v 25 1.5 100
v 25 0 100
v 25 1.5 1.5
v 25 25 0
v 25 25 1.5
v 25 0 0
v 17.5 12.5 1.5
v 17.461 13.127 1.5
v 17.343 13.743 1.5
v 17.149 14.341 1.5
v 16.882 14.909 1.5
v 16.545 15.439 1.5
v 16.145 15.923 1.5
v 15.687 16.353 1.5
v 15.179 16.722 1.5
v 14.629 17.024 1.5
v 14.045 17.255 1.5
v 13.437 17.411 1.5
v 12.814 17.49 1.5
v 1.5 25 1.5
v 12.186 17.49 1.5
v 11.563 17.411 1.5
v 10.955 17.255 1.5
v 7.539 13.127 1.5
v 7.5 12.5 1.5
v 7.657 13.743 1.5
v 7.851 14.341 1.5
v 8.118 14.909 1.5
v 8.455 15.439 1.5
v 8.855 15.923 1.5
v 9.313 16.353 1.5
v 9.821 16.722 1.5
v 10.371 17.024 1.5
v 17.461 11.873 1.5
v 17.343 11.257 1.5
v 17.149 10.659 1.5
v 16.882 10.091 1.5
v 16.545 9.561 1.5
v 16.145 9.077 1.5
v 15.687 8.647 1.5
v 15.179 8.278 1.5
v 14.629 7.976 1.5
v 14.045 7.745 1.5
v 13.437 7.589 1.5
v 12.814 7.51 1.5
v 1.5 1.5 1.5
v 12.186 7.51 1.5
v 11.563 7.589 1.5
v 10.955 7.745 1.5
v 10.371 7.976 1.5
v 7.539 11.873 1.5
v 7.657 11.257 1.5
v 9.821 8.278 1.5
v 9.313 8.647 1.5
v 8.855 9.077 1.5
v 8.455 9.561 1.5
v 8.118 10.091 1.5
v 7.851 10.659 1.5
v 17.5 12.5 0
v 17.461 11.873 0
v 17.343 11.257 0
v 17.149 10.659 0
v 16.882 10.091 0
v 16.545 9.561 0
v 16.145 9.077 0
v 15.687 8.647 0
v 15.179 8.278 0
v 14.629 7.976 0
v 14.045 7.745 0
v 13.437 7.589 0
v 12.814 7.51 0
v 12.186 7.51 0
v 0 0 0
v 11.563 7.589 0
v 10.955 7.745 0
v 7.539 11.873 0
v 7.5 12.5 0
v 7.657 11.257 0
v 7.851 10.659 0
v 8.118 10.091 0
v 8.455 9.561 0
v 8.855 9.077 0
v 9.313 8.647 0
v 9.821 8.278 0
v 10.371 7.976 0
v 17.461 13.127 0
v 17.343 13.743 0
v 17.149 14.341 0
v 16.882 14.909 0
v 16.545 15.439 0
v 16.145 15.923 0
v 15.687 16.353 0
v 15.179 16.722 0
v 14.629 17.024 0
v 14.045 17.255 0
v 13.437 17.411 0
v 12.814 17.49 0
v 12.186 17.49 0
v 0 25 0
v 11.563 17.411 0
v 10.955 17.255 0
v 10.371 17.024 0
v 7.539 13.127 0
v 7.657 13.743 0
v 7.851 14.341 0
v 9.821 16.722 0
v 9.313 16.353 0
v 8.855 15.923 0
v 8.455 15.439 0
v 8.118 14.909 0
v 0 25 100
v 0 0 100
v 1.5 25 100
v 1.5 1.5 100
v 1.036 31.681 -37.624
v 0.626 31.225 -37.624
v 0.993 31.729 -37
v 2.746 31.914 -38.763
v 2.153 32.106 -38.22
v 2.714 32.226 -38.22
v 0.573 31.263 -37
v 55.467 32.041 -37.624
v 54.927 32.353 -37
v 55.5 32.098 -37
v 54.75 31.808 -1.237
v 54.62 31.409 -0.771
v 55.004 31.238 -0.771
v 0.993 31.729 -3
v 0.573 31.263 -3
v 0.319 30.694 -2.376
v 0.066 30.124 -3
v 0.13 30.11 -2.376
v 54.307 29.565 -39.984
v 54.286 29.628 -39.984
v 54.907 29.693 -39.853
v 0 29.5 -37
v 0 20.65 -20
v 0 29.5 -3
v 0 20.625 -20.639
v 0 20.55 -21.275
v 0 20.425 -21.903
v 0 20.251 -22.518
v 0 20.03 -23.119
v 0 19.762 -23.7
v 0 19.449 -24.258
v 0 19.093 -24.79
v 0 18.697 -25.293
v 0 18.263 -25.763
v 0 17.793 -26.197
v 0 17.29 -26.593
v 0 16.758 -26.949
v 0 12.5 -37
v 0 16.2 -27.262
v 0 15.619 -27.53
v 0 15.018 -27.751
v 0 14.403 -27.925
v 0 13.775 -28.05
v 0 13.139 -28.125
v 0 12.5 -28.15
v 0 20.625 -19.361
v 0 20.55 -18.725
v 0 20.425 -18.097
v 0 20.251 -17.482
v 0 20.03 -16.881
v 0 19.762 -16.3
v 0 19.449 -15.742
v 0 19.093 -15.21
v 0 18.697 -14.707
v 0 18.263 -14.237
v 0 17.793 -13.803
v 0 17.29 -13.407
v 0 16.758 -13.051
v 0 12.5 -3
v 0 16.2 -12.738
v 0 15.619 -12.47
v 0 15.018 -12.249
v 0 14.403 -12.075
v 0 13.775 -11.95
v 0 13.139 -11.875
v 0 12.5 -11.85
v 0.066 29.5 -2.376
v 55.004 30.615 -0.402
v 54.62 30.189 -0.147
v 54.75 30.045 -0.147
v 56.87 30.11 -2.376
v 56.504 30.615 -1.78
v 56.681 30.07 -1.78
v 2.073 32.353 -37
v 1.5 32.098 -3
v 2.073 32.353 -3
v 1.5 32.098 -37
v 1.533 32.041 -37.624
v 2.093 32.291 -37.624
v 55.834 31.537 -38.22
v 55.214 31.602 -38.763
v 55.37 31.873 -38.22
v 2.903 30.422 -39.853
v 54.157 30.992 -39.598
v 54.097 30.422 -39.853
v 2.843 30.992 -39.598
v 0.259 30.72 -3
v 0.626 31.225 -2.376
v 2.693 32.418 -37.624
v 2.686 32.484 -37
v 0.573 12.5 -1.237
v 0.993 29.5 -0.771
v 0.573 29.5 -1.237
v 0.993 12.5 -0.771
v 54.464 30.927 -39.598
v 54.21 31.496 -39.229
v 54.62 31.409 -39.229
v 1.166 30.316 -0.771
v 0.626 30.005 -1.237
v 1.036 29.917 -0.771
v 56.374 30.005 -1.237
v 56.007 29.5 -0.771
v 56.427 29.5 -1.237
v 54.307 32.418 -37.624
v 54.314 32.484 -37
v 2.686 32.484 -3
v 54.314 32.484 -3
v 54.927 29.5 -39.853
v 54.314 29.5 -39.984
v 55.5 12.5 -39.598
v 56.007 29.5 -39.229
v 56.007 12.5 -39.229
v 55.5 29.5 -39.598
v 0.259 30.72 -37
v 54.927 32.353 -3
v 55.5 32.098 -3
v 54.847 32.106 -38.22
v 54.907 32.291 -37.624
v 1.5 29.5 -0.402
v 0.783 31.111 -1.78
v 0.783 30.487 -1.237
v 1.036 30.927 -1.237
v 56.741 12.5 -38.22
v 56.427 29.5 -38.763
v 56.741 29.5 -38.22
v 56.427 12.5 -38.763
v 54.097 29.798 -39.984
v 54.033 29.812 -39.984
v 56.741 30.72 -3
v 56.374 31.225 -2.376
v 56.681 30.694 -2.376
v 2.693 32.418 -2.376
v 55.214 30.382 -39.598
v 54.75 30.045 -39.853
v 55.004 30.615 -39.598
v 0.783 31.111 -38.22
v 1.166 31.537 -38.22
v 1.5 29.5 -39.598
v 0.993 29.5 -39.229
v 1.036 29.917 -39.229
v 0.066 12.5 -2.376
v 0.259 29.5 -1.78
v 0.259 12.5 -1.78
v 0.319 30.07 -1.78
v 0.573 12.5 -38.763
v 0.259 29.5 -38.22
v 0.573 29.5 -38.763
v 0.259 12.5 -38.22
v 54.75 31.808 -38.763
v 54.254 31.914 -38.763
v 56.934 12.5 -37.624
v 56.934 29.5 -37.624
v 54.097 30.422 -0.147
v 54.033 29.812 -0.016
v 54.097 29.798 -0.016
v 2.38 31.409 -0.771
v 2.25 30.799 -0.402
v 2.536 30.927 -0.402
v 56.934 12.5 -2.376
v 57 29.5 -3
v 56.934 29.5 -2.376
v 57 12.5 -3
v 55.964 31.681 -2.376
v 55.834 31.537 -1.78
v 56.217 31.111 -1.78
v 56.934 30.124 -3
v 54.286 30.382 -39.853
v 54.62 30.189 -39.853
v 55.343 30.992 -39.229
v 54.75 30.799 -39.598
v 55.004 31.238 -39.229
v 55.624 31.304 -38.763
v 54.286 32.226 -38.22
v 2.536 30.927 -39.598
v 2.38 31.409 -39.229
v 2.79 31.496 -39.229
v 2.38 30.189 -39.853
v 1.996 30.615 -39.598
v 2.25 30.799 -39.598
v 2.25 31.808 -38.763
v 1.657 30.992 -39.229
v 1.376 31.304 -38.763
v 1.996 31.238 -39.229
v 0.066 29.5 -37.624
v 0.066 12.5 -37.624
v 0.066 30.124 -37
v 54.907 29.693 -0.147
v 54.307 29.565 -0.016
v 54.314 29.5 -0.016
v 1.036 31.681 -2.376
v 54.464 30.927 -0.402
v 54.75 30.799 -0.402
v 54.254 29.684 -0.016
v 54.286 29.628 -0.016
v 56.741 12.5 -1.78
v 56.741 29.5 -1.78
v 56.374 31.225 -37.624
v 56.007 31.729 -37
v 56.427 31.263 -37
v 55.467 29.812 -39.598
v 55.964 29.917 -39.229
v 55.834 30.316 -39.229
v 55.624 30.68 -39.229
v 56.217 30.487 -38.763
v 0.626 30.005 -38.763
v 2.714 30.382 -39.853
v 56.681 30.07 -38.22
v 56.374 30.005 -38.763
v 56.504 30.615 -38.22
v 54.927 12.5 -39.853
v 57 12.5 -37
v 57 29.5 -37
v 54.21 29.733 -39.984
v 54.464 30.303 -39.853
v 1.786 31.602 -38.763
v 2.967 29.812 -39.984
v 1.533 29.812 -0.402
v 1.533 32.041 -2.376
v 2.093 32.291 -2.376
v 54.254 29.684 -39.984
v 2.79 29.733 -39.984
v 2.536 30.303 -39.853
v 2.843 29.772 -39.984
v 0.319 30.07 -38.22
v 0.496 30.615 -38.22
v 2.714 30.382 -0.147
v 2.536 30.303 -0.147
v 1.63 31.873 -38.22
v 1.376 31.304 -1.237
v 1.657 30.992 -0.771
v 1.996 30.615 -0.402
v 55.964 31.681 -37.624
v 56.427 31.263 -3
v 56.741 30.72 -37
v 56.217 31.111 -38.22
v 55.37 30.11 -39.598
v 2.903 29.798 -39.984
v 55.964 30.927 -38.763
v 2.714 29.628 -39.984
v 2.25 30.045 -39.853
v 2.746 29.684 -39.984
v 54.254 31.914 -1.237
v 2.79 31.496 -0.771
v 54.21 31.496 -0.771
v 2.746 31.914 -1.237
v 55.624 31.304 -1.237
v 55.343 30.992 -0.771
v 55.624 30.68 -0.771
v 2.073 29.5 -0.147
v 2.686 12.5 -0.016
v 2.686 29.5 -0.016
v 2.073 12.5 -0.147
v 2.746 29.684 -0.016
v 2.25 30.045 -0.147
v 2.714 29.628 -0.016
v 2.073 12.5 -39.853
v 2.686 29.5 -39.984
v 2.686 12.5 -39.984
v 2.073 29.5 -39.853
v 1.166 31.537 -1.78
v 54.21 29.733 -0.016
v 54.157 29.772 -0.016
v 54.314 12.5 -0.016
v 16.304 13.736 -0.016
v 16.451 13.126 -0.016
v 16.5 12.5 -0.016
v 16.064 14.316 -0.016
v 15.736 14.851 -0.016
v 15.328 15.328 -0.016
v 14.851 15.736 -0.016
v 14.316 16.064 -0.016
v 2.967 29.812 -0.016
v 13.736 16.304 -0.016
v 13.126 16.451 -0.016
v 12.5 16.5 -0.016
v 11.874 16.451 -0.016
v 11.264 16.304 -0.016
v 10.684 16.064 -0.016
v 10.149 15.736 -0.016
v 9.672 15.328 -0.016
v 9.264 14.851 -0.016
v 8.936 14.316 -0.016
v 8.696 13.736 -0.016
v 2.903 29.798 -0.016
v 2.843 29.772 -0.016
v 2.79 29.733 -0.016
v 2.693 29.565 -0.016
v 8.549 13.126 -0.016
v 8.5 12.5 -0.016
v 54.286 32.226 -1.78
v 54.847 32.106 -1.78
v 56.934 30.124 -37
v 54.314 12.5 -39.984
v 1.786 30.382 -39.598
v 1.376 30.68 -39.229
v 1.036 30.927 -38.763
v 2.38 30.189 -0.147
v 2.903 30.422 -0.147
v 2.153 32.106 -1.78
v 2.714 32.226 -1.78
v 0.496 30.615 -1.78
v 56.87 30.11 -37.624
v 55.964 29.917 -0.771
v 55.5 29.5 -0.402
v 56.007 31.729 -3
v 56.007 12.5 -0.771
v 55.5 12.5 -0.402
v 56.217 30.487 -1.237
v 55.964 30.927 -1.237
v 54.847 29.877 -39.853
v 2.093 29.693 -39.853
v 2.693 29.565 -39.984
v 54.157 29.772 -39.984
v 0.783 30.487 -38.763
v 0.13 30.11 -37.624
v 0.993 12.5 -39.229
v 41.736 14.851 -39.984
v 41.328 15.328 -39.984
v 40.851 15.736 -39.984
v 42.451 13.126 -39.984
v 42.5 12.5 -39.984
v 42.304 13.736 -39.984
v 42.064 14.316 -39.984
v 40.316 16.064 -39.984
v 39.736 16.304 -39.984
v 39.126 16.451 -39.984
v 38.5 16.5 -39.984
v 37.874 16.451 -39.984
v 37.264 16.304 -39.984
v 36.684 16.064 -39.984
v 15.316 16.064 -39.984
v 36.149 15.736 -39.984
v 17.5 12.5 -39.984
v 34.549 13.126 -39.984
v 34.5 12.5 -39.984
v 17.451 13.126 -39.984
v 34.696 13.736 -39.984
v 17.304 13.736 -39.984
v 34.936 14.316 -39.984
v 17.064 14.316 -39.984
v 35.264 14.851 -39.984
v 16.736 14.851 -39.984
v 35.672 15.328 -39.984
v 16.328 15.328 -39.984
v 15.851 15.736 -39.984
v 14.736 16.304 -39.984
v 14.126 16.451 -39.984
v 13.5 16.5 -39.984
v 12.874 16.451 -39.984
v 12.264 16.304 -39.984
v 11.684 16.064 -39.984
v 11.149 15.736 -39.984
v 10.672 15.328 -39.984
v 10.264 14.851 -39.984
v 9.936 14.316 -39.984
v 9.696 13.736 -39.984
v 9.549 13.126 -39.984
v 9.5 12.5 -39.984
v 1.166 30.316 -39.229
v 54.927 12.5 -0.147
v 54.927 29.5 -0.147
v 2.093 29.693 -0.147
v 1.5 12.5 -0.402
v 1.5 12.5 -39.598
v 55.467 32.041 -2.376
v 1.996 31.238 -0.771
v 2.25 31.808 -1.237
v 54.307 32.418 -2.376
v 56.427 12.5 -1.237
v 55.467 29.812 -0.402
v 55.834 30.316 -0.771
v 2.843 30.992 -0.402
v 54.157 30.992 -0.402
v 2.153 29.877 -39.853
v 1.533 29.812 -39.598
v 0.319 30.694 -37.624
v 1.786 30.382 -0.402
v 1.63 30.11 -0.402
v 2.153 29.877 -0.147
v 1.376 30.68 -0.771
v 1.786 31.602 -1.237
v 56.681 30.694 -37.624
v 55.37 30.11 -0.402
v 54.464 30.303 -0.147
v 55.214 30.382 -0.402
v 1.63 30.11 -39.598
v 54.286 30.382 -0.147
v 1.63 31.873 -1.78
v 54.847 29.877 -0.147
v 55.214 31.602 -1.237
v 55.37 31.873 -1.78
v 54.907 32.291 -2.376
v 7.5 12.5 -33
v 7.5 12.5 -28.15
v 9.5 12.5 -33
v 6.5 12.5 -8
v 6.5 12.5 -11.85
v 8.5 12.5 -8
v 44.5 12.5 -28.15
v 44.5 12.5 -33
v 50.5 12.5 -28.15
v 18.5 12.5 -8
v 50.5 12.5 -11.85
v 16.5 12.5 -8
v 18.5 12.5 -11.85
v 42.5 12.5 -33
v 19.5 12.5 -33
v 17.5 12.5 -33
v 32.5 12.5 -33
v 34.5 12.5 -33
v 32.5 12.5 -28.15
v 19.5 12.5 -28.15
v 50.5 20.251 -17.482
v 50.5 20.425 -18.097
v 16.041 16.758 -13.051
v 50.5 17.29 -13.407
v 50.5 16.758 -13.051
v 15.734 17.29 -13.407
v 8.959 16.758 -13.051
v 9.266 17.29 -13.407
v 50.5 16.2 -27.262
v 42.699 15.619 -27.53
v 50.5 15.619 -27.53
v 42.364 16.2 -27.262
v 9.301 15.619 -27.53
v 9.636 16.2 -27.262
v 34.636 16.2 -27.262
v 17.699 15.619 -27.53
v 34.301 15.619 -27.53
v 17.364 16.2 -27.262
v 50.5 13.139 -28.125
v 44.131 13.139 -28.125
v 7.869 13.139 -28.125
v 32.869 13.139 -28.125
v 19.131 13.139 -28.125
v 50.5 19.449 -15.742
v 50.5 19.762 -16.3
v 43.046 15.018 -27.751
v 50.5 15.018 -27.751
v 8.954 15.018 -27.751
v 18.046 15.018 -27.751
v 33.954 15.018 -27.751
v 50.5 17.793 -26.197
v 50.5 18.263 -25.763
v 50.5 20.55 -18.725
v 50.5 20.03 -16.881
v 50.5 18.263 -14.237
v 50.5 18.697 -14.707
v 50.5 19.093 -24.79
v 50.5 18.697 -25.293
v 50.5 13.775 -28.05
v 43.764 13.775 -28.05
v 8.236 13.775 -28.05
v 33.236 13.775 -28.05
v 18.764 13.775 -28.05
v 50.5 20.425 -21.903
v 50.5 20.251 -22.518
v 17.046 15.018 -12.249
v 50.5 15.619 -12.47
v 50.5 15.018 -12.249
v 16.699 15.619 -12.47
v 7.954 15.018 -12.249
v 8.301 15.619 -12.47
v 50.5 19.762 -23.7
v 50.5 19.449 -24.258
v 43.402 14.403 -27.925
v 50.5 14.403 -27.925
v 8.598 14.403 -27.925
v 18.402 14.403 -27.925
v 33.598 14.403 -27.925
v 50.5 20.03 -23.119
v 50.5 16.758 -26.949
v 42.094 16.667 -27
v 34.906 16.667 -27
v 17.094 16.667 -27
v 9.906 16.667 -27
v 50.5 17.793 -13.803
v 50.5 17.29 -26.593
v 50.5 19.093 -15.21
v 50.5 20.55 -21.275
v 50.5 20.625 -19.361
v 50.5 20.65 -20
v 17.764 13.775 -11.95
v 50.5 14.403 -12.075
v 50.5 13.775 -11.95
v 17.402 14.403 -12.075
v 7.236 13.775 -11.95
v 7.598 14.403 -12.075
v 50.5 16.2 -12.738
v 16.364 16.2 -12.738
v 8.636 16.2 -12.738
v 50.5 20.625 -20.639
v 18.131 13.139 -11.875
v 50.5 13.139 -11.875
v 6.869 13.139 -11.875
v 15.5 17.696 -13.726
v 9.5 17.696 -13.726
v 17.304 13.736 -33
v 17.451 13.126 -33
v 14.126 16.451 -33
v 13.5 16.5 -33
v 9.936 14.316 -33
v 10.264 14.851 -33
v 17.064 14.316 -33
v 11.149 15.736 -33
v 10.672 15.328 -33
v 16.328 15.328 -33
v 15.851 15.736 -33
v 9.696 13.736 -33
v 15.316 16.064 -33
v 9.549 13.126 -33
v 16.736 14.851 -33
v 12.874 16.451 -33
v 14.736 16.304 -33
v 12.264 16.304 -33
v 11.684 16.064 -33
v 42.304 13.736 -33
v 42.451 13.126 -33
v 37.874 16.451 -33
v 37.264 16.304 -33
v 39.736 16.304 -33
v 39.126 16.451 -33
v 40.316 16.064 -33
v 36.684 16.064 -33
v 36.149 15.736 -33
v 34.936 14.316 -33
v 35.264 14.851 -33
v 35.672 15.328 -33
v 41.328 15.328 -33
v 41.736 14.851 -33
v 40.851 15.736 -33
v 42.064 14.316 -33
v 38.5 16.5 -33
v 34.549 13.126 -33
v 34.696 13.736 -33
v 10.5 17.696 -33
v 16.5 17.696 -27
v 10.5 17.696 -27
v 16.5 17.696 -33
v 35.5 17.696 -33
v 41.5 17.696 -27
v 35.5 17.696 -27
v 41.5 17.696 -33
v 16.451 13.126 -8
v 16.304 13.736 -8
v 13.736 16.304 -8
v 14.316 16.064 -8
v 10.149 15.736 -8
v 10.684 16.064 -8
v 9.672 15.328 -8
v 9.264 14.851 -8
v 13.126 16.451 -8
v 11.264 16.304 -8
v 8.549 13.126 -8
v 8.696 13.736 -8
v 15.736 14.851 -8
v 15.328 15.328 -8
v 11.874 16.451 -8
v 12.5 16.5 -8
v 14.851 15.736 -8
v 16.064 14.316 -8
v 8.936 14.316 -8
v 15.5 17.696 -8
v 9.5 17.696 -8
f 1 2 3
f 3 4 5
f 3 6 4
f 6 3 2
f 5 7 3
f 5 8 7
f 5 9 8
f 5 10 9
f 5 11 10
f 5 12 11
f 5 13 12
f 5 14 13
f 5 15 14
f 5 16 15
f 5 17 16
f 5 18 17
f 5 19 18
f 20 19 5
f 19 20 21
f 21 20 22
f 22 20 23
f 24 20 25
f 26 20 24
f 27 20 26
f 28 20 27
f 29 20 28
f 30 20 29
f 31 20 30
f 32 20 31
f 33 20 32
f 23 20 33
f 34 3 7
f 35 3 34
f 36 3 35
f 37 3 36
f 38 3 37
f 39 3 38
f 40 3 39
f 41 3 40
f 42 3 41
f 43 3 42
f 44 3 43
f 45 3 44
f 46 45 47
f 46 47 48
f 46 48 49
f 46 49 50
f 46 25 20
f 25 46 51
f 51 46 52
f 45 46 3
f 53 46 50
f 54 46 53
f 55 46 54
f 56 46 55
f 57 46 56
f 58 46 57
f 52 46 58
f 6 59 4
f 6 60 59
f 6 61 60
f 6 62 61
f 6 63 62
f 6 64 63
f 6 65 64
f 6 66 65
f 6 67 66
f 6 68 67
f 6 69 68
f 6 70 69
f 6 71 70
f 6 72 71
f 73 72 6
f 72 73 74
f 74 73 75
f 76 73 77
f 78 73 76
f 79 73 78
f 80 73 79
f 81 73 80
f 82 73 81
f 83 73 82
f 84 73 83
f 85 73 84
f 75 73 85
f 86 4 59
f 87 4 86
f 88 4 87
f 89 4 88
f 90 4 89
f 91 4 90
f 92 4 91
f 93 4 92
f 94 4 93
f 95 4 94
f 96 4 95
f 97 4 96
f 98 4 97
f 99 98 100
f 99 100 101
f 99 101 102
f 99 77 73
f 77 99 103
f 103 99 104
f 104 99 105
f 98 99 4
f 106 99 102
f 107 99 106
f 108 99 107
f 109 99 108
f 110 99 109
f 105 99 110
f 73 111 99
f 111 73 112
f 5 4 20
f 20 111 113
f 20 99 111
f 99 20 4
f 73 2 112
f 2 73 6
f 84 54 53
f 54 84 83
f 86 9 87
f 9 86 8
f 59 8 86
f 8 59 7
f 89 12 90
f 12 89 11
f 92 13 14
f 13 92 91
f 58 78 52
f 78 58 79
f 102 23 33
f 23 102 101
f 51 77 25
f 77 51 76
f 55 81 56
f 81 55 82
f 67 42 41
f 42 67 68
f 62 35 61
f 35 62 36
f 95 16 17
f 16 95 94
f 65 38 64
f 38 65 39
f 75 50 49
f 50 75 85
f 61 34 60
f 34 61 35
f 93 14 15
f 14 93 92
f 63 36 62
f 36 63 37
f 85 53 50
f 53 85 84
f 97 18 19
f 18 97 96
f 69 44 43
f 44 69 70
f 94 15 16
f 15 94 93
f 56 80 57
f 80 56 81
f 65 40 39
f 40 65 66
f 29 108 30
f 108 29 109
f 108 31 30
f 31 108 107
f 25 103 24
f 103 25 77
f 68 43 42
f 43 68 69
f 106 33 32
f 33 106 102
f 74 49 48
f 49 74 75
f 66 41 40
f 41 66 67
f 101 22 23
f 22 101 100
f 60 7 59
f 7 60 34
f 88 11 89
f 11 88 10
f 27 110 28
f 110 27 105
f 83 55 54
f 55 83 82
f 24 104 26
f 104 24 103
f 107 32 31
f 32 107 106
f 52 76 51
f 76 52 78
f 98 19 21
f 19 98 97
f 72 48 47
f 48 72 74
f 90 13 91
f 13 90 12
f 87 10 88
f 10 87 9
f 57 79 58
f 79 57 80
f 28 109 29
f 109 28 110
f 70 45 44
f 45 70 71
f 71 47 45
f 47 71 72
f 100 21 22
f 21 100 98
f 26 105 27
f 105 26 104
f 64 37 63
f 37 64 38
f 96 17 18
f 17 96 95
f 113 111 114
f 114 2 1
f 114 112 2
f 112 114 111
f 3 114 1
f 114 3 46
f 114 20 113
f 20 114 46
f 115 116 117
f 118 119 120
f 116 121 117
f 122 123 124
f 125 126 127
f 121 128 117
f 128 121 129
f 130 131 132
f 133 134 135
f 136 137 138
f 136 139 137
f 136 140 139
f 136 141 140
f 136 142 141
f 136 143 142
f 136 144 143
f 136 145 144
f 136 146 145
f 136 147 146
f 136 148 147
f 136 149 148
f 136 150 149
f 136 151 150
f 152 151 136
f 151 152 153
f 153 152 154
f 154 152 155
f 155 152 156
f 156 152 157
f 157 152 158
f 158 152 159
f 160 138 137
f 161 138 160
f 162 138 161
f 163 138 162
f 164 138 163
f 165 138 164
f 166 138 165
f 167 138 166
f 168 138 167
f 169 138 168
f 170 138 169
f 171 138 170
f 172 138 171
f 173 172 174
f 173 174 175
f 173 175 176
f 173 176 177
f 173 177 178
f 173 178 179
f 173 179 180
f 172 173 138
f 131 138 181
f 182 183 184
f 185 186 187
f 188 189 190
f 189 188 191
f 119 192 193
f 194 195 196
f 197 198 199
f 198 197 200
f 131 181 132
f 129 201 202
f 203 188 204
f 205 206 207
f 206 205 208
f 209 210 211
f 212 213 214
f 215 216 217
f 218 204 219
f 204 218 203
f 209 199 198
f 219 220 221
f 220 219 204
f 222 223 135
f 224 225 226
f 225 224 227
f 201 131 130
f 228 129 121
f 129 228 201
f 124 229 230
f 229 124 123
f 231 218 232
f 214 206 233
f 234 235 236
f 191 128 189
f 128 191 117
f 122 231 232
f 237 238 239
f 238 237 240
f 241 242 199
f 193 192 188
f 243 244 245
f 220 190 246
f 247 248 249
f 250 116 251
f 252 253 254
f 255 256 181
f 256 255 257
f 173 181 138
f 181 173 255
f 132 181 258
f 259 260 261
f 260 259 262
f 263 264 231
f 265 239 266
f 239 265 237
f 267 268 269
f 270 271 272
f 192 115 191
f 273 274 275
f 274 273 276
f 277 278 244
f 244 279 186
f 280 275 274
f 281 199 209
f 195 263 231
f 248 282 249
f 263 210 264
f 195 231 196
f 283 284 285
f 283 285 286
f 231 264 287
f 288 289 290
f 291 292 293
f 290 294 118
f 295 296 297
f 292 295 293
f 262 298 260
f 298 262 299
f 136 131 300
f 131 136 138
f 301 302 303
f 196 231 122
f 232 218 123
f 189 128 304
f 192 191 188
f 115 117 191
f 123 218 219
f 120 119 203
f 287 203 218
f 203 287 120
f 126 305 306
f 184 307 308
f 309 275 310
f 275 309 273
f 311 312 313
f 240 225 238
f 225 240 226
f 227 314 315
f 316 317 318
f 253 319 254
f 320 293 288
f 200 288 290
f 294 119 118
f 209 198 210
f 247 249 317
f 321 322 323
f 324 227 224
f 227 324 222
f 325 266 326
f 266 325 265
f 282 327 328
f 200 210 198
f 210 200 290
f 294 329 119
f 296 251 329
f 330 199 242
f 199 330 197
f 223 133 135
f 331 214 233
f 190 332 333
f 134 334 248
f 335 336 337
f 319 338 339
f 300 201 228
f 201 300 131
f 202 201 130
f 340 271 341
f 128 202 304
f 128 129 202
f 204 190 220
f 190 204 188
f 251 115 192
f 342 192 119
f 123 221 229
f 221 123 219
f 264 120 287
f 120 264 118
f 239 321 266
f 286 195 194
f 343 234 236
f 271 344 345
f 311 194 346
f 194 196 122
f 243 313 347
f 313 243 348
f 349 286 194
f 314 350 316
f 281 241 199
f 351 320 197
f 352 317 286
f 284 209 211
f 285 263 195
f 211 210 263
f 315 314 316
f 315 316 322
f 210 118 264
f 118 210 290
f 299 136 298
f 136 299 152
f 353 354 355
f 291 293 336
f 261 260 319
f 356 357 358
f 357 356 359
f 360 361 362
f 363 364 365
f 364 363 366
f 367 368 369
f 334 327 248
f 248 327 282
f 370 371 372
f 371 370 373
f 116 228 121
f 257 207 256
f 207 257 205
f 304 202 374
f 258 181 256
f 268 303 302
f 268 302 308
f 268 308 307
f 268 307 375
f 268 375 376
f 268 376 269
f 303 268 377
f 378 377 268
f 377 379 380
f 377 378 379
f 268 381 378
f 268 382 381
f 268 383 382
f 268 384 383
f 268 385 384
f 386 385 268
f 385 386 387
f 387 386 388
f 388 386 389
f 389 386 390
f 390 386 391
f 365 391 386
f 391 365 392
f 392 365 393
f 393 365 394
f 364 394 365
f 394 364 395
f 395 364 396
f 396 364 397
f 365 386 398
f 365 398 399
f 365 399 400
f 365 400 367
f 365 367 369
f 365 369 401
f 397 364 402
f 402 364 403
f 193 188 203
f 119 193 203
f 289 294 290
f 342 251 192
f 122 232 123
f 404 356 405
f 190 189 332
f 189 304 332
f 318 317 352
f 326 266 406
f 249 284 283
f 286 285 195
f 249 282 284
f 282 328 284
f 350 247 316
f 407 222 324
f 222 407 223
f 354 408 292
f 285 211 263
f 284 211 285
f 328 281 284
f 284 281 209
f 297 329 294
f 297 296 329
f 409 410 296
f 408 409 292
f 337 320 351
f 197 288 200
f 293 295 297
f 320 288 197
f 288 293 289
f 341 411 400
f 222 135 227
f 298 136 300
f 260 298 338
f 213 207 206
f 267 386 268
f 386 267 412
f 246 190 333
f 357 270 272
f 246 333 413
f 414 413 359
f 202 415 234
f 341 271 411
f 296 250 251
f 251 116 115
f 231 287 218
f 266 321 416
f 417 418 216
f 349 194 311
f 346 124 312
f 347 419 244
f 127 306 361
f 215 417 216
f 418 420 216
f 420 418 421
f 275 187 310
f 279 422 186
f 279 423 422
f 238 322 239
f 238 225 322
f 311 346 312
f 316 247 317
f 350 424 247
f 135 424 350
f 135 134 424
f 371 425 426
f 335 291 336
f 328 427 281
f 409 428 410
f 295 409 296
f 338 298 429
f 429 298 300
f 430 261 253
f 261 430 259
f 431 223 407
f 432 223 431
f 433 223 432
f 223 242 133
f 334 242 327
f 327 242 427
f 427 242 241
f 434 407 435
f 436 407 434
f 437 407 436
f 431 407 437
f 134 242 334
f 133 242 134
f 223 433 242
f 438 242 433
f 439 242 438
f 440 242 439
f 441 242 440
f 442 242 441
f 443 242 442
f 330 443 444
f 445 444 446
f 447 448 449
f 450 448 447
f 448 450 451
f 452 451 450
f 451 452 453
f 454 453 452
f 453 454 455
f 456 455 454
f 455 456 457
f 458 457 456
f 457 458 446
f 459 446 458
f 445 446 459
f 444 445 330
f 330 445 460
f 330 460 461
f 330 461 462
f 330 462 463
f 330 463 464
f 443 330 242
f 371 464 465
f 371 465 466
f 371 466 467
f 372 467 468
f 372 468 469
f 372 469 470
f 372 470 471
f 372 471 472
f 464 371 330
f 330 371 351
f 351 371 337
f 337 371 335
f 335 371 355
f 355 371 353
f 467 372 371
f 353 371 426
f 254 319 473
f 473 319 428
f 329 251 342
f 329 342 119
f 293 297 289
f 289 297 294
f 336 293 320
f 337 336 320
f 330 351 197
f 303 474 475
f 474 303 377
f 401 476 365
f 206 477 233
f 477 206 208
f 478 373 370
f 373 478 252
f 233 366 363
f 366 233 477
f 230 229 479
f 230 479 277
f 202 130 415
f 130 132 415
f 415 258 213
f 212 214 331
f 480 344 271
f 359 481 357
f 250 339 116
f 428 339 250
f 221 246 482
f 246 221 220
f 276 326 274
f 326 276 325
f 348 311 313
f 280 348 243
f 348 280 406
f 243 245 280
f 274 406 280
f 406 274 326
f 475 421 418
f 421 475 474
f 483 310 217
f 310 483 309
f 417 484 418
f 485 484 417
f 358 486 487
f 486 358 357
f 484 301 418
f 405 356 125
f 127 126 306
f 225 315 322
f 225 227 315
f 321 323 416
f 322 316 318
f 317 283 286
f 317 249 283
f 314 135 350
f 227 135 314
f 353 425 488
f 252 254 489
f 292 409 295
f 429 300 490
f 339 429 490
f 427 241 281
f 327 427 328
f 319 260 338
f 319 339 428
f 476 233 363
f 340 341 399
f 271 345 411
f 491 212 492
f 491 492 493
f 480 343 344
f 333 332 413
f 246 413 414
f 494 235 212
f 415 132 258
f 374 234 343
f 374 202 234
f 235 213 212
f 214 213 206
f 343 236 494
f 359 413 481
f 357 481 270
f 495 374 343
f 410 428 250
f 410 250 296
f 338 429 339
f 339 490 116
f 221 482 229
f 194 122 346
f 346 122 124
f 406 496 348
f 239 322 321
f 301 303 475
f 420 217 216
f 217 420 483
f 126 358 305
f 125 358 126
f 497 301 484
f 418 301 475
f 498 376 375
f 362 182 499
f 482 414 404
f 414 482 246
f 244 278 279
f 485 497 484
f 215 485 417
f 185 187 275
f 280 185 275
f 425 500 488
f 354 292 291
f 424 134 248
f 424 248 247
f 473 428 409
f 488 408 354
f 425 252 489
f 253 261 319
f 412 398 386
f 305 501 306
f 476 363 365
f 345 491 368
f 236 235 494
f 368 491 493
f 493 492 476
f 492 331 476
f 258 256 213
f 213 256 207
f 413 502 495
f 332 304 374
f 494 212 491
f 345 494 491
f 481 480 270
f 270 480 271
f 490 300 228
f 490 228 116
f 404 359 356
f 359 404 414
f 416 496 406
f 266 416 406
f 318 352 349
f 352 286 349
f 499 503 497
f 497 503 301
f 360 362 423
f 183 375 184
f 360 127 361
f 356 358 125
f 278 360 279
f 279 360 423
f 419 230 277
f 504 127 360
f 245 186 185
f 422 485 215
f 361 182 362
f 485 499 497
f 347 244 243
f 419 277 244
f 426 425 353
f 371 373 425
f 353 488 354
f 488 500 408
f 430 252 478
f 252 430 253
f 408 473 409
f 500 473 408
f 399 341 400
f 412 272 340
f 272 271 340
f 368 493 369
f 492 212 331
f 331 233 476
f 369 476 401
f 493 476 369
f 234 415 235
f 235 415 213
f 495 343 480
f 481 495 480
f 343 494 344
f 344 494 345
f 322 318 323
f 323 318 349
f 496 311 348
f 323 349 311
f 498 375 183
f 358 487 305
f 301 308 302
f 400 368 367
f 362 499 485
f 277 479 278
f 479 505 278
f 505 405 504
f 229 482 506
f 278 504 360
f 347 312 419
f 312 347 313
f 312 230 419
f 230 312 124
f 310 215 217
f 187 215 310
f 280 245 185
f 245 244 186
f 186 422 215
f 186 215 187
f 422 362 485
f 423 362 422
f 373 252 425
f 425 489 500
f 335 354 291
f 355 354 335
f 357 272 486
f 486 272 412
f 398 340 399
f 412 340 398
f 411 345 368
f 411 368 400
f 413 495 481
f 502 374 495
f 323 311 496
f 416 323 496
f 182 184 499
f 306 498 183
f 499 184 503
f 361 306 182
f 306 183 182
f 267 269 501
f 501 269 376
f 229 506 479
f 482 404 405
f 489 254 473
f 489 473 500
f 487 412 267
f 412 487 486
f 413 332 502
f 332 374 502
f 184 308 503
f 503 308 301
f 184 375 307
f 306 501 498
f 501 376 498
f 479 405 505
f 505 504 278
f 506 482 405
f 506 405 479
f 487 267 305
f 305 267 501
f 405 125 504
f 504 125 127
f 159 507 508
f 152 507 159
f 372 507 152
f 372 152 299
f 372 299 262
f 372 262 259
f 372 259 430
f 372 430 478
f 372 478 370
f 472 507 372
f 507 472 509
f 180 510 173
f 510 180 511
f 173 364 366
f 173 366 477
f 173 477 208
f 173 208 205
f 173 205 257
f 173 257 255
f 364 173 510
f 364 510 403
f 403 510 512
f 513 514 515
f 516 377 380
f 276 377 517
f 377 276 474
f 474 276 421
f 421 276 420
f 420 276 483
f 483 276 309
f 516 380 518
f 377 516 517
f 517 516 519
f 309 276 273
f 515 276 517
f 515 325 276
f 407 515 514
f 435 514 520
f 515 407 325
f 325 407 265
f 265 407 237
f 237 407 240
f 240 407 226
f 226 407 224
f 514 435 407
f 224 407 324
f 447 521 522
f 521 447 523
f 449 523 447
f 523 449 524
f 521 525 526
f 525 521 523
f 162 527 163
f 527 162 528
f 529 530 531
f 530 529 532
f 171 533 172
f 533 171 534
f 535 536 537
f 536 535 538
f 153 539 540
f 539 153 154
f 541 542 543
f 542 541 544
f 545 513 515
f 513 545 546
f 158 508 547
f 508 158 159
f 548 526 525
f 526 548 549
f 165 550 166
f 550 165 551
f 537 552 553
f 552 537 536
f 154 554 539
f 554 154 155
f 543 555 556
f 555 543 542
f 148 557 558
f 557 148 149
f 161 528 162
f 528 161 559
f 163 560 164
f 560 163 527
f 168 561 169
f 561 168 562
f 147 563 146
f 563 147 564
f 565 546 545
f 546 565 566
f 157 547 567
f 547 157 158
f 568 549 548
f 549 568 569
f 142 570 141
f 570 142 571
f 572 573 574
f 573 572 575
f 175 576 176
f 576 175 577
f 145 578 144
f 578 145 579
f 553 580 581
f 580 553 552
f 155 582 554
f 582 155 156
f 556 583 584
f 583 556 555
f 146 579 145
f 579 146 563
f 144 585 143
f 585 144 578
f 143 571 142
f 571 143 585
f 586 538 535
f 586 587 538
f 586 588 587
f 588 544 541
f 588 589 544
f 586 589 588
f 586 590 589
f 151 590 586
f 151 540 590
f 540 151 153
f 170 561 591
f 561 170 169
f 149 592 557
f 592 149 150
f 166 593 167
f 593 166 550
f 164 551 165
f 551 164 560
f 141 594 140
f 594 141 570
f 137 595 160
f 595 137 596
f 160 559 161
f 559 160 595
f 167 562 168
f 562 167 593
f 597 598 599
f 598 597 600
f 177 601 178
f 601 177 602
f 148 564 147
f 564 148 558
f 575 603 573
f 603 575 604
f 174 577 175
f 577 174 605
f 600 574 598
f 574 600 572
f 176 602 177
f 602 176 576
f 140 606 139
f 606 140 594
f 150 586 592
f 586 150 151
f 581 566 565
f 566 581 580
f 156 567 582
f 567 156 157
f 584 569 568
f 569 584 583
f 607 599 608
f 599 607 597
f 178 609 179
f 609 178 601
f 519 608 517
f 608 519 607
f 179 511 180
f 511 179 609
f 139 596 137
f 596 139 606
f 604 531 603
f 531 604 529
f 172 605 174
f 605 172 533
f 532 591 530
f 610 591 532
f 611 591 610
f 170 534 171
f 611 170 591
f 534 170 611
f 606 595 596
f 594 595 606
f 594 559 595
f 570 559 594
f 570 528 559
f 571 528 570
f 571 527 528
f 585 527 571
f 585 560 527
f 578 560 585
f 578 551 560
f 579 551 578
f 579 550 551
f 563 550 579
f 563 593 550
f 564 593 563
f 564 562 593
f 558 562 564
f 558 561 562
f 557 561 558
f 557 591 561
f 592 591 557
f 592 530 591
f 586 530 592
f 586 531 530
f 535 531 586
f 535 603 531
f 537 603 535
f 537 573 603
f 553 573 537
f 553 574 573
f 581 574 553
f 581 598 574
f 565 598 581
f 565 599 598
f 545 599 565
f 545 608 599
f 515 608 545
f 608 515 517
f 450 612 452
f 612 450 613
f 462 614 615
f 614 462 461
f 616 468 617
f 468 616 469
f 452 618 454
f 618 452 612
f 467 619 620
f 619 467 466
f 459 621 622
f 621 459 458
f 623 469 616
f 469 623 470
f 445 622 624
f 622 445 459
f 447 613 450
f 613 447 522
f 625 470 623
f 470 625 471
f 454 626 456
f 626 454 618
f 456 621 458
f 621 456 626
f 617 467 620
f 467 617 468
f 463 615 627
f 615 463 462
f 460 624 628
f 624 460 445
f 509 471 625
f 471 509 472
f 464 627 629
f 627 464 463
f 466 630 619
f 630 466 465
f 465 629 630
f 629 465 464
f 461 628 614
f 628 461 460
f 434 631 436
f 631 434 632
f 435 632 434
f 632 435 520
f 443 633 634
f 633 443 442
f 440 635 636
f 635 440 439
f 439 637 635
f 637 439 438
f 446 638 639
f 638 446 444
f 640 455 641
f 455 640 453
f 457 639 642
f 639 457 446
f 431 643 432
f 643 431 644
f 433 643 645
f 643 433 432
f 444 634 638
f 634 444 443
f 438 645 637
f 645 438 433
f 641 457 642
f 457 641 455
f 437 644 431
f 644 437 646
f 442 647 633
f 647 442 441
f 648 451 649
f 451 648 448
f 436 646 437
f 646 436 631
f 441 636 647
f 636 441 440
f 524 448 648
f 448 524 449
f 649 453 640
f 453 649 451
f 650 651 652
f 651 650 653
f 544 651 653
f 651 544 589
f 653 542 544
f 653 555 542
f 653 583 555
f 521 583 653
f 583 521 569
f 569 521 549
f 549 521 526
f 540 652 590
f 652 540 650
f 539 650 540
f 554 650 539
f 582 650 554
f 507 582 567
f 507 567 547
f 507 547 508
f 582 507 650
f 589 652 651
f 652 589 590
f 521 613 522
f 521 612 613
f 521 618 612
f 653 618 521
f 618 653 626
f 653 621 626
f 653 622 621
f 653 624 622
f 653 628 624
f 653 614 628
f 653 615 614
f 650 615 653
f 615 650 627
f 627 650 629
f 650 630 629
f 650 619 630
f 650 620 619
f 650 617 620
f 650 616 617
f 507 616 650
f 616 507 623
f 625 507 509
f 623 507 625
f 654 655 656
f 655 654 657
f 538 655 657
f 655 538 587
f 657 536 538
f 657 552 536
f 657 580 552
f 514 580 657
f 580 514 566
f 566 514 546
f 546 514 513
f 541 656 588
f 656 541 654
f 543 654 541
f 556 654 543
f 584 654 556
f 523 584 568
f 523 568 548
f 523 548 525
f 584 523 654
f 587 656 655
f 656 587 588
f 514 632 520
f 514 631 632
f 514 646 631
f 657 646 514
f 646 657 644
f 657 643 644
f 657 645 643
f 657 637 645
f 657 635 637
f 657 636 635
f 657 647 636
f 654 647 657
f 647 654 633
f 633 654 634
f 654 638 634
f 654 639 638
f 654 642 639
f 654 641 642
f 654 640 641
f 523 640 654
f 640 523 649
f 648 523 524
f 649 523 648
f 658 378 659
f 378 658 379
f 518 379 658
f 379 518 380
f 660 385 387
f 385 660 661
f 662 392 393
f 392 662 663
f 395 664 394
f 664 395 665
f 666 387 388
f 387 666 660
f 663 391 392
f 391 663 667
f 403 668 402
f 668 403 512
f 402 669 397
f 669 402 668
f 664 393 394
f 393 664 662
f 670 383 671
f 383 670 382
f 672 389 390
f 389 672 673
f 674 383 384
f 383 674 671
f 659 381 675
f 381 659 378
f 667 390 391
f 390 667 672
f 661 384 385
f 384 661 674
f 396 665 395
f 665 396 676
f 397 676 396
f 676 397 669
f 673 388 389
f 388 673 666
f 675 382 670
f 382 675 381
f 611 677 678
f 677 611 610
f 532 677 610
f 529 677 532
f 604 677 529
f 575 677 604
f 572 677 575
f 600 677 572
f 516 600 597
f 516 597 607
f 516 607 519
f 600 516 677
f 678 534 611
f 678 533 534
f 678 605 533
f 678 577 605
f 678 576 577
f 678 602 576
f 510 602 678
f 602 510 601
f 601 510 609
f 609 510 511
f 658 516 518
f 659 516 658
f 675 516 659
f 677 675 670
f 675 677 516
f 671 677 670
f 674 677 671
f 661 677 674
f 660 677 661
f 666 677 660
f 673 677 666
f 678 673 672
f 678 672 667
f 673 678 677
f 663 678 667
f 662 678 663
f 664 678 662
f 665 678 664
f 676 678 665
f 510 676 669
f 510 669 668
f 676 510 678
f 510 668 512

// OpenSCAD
// Aifred - FabLab Open Source Autonomous Troley
q      =  5;



play    =  0.3;

axis_di = 16.0;
axis_le = 52.0;
axis_lc = 45.0;
axis_hc =  3.0;
axis_ga =  3.0;

feet_le = 25.0;
feet_wi = 25.0;
feet_di = 10.0;
feet_th =  1.5;

fix_ra  =  3.0;

feet(100);

ax_fix();
//wheel();


module ax_fix() color([0.99,0.7,0.1,1]){
    translate([ (axis_le+5)/2, feet_wi/2,-axis_di*1.25]) difference() {
        rcube([axis_le+5, axis_di*2.5, axis_di*2.5], fix_ra);
        translate([-50,-50,-50]) cube([100,50,100]);
        translate([-(axis_le+5)/2-1.5, 0,0   ]) rotate([0,90,0]) cylinder(d=axis_di+play,h=axis_le,$fn=axis_di*q);
        translate([-15, 0,-axis_di*1.25]) cylinder(d= 8, h=16,$fn=8*q);
        translate([ 10, 0,-axis_di*1.25]) cylinder(d= 8, h=16,$fn=8*q);
        translate([-15, 0,-axis_di*1.25+7]) cylinder(d=12, h= 6,$fn=6  );
        translate([ 10, 0,-axis_di*1.25+7]) cylinder(d=12, h= 6,$fn=6  );
        translate([-(axis_le+5)/2+feet_le/2,0,0]) cylinder(d= 8, h=30,$fn=8*q);
        translate([-(axis_le+5)/2+feet_le/2,0,6]) cylinder(d=12, h=6,$fn=6);
    }
}


module feet(hi) color([0.3,0.3,0.35,1]) {
    cube([feet_le,feet_th,     hi]);
    cube([feet_th,feet_wi,     hi]);
    difference() {
        cube([feet_le,feet_wi,feet_th]);
        translate([feet_le/2,feet_wi/2, -1]) cylinder(d=feet_di, h=100, $fn=feet_di*q);
    }
}


module axis() color([0.6,0.6,0.65,1]) {
    translate([0,0,-axis_le]) difference() {
        cylinder(d=axis_di, h=axis_le+10, $fn=axis_di*q);
        translate([-10-axis_di/2+axis_hc,-10,2.9]) cube([10, 20, axis_lc]);
    }
}


module wheel() translate([-2, feet_wi/2,-axis_di*1.25]) rotate([0,-90,0]){
    h1= 4.3;
    h2=46.0;
    h3=12.0;
    wt=44.5;
    axis();
    color([0.8,0.8,0.8,1]) {
    difference() {
        cylinder(d1=35,d2=46,h=h1,$fn=46*q);
        cylinder(d=25,h=100,center=true,$fn=25*q);
    }
    translate([0,0,h1   ]) cylinder(d=135,h=h2,$fn=135*q);
    translate([0,0,h1+h2]) cylinder(d1=128,d2=110,h=h3,$fn=135*q);
    }
    //translate([0, 0,h1+1+wt/2]) cylinder(d=175,h=1,$fn=135*q);
    //translate([0, 0,h1+1     ]) cylinder(d=152,h=1,$fn=135*q);
    color([0.2,0.2,0.2,1]) 
    difference()  {
        translate([0, 0,h1+1+wt/2]) rotate_extrude(convexity = 10, $fn = 100)
        translate([60.5, 0, 0]) circle(r = 27, $fn = 55*q);
        translate([-200,-200,h1+1+wt]) cube([400,400,100]);
        translate([-200,-200,h1+1-100]) cube([400,400,100]);
    }
    
}


module rcube(siz, rad) {            // rounded cube 
    xi = max(0.0001,siz[0]-2*rad);  // need to always ahve a value > 0
    yi = max(0.0001,siz[1]-2*rad);
    hi = max(0.0001,siz[2]-2*rad);
    minkowski() {
        cube([xi, yi, hi], center=true);
        sphere(r=rad, $fn=2*rad*q);
    }  
}


module srcube(siz, rad) {           // semi rounded cube
    xi = max(0.0001,siz[0]-2*rad);
    yi = max(0.0001,siz[1]-2*rad);
    hi =            siz[2]/2;
    minkowski() {
        cube([xi, yi, hi], center=true);
        cylinder(r=rad, h=hi, center=true, $fn=2*rad*q);
    }  
}
